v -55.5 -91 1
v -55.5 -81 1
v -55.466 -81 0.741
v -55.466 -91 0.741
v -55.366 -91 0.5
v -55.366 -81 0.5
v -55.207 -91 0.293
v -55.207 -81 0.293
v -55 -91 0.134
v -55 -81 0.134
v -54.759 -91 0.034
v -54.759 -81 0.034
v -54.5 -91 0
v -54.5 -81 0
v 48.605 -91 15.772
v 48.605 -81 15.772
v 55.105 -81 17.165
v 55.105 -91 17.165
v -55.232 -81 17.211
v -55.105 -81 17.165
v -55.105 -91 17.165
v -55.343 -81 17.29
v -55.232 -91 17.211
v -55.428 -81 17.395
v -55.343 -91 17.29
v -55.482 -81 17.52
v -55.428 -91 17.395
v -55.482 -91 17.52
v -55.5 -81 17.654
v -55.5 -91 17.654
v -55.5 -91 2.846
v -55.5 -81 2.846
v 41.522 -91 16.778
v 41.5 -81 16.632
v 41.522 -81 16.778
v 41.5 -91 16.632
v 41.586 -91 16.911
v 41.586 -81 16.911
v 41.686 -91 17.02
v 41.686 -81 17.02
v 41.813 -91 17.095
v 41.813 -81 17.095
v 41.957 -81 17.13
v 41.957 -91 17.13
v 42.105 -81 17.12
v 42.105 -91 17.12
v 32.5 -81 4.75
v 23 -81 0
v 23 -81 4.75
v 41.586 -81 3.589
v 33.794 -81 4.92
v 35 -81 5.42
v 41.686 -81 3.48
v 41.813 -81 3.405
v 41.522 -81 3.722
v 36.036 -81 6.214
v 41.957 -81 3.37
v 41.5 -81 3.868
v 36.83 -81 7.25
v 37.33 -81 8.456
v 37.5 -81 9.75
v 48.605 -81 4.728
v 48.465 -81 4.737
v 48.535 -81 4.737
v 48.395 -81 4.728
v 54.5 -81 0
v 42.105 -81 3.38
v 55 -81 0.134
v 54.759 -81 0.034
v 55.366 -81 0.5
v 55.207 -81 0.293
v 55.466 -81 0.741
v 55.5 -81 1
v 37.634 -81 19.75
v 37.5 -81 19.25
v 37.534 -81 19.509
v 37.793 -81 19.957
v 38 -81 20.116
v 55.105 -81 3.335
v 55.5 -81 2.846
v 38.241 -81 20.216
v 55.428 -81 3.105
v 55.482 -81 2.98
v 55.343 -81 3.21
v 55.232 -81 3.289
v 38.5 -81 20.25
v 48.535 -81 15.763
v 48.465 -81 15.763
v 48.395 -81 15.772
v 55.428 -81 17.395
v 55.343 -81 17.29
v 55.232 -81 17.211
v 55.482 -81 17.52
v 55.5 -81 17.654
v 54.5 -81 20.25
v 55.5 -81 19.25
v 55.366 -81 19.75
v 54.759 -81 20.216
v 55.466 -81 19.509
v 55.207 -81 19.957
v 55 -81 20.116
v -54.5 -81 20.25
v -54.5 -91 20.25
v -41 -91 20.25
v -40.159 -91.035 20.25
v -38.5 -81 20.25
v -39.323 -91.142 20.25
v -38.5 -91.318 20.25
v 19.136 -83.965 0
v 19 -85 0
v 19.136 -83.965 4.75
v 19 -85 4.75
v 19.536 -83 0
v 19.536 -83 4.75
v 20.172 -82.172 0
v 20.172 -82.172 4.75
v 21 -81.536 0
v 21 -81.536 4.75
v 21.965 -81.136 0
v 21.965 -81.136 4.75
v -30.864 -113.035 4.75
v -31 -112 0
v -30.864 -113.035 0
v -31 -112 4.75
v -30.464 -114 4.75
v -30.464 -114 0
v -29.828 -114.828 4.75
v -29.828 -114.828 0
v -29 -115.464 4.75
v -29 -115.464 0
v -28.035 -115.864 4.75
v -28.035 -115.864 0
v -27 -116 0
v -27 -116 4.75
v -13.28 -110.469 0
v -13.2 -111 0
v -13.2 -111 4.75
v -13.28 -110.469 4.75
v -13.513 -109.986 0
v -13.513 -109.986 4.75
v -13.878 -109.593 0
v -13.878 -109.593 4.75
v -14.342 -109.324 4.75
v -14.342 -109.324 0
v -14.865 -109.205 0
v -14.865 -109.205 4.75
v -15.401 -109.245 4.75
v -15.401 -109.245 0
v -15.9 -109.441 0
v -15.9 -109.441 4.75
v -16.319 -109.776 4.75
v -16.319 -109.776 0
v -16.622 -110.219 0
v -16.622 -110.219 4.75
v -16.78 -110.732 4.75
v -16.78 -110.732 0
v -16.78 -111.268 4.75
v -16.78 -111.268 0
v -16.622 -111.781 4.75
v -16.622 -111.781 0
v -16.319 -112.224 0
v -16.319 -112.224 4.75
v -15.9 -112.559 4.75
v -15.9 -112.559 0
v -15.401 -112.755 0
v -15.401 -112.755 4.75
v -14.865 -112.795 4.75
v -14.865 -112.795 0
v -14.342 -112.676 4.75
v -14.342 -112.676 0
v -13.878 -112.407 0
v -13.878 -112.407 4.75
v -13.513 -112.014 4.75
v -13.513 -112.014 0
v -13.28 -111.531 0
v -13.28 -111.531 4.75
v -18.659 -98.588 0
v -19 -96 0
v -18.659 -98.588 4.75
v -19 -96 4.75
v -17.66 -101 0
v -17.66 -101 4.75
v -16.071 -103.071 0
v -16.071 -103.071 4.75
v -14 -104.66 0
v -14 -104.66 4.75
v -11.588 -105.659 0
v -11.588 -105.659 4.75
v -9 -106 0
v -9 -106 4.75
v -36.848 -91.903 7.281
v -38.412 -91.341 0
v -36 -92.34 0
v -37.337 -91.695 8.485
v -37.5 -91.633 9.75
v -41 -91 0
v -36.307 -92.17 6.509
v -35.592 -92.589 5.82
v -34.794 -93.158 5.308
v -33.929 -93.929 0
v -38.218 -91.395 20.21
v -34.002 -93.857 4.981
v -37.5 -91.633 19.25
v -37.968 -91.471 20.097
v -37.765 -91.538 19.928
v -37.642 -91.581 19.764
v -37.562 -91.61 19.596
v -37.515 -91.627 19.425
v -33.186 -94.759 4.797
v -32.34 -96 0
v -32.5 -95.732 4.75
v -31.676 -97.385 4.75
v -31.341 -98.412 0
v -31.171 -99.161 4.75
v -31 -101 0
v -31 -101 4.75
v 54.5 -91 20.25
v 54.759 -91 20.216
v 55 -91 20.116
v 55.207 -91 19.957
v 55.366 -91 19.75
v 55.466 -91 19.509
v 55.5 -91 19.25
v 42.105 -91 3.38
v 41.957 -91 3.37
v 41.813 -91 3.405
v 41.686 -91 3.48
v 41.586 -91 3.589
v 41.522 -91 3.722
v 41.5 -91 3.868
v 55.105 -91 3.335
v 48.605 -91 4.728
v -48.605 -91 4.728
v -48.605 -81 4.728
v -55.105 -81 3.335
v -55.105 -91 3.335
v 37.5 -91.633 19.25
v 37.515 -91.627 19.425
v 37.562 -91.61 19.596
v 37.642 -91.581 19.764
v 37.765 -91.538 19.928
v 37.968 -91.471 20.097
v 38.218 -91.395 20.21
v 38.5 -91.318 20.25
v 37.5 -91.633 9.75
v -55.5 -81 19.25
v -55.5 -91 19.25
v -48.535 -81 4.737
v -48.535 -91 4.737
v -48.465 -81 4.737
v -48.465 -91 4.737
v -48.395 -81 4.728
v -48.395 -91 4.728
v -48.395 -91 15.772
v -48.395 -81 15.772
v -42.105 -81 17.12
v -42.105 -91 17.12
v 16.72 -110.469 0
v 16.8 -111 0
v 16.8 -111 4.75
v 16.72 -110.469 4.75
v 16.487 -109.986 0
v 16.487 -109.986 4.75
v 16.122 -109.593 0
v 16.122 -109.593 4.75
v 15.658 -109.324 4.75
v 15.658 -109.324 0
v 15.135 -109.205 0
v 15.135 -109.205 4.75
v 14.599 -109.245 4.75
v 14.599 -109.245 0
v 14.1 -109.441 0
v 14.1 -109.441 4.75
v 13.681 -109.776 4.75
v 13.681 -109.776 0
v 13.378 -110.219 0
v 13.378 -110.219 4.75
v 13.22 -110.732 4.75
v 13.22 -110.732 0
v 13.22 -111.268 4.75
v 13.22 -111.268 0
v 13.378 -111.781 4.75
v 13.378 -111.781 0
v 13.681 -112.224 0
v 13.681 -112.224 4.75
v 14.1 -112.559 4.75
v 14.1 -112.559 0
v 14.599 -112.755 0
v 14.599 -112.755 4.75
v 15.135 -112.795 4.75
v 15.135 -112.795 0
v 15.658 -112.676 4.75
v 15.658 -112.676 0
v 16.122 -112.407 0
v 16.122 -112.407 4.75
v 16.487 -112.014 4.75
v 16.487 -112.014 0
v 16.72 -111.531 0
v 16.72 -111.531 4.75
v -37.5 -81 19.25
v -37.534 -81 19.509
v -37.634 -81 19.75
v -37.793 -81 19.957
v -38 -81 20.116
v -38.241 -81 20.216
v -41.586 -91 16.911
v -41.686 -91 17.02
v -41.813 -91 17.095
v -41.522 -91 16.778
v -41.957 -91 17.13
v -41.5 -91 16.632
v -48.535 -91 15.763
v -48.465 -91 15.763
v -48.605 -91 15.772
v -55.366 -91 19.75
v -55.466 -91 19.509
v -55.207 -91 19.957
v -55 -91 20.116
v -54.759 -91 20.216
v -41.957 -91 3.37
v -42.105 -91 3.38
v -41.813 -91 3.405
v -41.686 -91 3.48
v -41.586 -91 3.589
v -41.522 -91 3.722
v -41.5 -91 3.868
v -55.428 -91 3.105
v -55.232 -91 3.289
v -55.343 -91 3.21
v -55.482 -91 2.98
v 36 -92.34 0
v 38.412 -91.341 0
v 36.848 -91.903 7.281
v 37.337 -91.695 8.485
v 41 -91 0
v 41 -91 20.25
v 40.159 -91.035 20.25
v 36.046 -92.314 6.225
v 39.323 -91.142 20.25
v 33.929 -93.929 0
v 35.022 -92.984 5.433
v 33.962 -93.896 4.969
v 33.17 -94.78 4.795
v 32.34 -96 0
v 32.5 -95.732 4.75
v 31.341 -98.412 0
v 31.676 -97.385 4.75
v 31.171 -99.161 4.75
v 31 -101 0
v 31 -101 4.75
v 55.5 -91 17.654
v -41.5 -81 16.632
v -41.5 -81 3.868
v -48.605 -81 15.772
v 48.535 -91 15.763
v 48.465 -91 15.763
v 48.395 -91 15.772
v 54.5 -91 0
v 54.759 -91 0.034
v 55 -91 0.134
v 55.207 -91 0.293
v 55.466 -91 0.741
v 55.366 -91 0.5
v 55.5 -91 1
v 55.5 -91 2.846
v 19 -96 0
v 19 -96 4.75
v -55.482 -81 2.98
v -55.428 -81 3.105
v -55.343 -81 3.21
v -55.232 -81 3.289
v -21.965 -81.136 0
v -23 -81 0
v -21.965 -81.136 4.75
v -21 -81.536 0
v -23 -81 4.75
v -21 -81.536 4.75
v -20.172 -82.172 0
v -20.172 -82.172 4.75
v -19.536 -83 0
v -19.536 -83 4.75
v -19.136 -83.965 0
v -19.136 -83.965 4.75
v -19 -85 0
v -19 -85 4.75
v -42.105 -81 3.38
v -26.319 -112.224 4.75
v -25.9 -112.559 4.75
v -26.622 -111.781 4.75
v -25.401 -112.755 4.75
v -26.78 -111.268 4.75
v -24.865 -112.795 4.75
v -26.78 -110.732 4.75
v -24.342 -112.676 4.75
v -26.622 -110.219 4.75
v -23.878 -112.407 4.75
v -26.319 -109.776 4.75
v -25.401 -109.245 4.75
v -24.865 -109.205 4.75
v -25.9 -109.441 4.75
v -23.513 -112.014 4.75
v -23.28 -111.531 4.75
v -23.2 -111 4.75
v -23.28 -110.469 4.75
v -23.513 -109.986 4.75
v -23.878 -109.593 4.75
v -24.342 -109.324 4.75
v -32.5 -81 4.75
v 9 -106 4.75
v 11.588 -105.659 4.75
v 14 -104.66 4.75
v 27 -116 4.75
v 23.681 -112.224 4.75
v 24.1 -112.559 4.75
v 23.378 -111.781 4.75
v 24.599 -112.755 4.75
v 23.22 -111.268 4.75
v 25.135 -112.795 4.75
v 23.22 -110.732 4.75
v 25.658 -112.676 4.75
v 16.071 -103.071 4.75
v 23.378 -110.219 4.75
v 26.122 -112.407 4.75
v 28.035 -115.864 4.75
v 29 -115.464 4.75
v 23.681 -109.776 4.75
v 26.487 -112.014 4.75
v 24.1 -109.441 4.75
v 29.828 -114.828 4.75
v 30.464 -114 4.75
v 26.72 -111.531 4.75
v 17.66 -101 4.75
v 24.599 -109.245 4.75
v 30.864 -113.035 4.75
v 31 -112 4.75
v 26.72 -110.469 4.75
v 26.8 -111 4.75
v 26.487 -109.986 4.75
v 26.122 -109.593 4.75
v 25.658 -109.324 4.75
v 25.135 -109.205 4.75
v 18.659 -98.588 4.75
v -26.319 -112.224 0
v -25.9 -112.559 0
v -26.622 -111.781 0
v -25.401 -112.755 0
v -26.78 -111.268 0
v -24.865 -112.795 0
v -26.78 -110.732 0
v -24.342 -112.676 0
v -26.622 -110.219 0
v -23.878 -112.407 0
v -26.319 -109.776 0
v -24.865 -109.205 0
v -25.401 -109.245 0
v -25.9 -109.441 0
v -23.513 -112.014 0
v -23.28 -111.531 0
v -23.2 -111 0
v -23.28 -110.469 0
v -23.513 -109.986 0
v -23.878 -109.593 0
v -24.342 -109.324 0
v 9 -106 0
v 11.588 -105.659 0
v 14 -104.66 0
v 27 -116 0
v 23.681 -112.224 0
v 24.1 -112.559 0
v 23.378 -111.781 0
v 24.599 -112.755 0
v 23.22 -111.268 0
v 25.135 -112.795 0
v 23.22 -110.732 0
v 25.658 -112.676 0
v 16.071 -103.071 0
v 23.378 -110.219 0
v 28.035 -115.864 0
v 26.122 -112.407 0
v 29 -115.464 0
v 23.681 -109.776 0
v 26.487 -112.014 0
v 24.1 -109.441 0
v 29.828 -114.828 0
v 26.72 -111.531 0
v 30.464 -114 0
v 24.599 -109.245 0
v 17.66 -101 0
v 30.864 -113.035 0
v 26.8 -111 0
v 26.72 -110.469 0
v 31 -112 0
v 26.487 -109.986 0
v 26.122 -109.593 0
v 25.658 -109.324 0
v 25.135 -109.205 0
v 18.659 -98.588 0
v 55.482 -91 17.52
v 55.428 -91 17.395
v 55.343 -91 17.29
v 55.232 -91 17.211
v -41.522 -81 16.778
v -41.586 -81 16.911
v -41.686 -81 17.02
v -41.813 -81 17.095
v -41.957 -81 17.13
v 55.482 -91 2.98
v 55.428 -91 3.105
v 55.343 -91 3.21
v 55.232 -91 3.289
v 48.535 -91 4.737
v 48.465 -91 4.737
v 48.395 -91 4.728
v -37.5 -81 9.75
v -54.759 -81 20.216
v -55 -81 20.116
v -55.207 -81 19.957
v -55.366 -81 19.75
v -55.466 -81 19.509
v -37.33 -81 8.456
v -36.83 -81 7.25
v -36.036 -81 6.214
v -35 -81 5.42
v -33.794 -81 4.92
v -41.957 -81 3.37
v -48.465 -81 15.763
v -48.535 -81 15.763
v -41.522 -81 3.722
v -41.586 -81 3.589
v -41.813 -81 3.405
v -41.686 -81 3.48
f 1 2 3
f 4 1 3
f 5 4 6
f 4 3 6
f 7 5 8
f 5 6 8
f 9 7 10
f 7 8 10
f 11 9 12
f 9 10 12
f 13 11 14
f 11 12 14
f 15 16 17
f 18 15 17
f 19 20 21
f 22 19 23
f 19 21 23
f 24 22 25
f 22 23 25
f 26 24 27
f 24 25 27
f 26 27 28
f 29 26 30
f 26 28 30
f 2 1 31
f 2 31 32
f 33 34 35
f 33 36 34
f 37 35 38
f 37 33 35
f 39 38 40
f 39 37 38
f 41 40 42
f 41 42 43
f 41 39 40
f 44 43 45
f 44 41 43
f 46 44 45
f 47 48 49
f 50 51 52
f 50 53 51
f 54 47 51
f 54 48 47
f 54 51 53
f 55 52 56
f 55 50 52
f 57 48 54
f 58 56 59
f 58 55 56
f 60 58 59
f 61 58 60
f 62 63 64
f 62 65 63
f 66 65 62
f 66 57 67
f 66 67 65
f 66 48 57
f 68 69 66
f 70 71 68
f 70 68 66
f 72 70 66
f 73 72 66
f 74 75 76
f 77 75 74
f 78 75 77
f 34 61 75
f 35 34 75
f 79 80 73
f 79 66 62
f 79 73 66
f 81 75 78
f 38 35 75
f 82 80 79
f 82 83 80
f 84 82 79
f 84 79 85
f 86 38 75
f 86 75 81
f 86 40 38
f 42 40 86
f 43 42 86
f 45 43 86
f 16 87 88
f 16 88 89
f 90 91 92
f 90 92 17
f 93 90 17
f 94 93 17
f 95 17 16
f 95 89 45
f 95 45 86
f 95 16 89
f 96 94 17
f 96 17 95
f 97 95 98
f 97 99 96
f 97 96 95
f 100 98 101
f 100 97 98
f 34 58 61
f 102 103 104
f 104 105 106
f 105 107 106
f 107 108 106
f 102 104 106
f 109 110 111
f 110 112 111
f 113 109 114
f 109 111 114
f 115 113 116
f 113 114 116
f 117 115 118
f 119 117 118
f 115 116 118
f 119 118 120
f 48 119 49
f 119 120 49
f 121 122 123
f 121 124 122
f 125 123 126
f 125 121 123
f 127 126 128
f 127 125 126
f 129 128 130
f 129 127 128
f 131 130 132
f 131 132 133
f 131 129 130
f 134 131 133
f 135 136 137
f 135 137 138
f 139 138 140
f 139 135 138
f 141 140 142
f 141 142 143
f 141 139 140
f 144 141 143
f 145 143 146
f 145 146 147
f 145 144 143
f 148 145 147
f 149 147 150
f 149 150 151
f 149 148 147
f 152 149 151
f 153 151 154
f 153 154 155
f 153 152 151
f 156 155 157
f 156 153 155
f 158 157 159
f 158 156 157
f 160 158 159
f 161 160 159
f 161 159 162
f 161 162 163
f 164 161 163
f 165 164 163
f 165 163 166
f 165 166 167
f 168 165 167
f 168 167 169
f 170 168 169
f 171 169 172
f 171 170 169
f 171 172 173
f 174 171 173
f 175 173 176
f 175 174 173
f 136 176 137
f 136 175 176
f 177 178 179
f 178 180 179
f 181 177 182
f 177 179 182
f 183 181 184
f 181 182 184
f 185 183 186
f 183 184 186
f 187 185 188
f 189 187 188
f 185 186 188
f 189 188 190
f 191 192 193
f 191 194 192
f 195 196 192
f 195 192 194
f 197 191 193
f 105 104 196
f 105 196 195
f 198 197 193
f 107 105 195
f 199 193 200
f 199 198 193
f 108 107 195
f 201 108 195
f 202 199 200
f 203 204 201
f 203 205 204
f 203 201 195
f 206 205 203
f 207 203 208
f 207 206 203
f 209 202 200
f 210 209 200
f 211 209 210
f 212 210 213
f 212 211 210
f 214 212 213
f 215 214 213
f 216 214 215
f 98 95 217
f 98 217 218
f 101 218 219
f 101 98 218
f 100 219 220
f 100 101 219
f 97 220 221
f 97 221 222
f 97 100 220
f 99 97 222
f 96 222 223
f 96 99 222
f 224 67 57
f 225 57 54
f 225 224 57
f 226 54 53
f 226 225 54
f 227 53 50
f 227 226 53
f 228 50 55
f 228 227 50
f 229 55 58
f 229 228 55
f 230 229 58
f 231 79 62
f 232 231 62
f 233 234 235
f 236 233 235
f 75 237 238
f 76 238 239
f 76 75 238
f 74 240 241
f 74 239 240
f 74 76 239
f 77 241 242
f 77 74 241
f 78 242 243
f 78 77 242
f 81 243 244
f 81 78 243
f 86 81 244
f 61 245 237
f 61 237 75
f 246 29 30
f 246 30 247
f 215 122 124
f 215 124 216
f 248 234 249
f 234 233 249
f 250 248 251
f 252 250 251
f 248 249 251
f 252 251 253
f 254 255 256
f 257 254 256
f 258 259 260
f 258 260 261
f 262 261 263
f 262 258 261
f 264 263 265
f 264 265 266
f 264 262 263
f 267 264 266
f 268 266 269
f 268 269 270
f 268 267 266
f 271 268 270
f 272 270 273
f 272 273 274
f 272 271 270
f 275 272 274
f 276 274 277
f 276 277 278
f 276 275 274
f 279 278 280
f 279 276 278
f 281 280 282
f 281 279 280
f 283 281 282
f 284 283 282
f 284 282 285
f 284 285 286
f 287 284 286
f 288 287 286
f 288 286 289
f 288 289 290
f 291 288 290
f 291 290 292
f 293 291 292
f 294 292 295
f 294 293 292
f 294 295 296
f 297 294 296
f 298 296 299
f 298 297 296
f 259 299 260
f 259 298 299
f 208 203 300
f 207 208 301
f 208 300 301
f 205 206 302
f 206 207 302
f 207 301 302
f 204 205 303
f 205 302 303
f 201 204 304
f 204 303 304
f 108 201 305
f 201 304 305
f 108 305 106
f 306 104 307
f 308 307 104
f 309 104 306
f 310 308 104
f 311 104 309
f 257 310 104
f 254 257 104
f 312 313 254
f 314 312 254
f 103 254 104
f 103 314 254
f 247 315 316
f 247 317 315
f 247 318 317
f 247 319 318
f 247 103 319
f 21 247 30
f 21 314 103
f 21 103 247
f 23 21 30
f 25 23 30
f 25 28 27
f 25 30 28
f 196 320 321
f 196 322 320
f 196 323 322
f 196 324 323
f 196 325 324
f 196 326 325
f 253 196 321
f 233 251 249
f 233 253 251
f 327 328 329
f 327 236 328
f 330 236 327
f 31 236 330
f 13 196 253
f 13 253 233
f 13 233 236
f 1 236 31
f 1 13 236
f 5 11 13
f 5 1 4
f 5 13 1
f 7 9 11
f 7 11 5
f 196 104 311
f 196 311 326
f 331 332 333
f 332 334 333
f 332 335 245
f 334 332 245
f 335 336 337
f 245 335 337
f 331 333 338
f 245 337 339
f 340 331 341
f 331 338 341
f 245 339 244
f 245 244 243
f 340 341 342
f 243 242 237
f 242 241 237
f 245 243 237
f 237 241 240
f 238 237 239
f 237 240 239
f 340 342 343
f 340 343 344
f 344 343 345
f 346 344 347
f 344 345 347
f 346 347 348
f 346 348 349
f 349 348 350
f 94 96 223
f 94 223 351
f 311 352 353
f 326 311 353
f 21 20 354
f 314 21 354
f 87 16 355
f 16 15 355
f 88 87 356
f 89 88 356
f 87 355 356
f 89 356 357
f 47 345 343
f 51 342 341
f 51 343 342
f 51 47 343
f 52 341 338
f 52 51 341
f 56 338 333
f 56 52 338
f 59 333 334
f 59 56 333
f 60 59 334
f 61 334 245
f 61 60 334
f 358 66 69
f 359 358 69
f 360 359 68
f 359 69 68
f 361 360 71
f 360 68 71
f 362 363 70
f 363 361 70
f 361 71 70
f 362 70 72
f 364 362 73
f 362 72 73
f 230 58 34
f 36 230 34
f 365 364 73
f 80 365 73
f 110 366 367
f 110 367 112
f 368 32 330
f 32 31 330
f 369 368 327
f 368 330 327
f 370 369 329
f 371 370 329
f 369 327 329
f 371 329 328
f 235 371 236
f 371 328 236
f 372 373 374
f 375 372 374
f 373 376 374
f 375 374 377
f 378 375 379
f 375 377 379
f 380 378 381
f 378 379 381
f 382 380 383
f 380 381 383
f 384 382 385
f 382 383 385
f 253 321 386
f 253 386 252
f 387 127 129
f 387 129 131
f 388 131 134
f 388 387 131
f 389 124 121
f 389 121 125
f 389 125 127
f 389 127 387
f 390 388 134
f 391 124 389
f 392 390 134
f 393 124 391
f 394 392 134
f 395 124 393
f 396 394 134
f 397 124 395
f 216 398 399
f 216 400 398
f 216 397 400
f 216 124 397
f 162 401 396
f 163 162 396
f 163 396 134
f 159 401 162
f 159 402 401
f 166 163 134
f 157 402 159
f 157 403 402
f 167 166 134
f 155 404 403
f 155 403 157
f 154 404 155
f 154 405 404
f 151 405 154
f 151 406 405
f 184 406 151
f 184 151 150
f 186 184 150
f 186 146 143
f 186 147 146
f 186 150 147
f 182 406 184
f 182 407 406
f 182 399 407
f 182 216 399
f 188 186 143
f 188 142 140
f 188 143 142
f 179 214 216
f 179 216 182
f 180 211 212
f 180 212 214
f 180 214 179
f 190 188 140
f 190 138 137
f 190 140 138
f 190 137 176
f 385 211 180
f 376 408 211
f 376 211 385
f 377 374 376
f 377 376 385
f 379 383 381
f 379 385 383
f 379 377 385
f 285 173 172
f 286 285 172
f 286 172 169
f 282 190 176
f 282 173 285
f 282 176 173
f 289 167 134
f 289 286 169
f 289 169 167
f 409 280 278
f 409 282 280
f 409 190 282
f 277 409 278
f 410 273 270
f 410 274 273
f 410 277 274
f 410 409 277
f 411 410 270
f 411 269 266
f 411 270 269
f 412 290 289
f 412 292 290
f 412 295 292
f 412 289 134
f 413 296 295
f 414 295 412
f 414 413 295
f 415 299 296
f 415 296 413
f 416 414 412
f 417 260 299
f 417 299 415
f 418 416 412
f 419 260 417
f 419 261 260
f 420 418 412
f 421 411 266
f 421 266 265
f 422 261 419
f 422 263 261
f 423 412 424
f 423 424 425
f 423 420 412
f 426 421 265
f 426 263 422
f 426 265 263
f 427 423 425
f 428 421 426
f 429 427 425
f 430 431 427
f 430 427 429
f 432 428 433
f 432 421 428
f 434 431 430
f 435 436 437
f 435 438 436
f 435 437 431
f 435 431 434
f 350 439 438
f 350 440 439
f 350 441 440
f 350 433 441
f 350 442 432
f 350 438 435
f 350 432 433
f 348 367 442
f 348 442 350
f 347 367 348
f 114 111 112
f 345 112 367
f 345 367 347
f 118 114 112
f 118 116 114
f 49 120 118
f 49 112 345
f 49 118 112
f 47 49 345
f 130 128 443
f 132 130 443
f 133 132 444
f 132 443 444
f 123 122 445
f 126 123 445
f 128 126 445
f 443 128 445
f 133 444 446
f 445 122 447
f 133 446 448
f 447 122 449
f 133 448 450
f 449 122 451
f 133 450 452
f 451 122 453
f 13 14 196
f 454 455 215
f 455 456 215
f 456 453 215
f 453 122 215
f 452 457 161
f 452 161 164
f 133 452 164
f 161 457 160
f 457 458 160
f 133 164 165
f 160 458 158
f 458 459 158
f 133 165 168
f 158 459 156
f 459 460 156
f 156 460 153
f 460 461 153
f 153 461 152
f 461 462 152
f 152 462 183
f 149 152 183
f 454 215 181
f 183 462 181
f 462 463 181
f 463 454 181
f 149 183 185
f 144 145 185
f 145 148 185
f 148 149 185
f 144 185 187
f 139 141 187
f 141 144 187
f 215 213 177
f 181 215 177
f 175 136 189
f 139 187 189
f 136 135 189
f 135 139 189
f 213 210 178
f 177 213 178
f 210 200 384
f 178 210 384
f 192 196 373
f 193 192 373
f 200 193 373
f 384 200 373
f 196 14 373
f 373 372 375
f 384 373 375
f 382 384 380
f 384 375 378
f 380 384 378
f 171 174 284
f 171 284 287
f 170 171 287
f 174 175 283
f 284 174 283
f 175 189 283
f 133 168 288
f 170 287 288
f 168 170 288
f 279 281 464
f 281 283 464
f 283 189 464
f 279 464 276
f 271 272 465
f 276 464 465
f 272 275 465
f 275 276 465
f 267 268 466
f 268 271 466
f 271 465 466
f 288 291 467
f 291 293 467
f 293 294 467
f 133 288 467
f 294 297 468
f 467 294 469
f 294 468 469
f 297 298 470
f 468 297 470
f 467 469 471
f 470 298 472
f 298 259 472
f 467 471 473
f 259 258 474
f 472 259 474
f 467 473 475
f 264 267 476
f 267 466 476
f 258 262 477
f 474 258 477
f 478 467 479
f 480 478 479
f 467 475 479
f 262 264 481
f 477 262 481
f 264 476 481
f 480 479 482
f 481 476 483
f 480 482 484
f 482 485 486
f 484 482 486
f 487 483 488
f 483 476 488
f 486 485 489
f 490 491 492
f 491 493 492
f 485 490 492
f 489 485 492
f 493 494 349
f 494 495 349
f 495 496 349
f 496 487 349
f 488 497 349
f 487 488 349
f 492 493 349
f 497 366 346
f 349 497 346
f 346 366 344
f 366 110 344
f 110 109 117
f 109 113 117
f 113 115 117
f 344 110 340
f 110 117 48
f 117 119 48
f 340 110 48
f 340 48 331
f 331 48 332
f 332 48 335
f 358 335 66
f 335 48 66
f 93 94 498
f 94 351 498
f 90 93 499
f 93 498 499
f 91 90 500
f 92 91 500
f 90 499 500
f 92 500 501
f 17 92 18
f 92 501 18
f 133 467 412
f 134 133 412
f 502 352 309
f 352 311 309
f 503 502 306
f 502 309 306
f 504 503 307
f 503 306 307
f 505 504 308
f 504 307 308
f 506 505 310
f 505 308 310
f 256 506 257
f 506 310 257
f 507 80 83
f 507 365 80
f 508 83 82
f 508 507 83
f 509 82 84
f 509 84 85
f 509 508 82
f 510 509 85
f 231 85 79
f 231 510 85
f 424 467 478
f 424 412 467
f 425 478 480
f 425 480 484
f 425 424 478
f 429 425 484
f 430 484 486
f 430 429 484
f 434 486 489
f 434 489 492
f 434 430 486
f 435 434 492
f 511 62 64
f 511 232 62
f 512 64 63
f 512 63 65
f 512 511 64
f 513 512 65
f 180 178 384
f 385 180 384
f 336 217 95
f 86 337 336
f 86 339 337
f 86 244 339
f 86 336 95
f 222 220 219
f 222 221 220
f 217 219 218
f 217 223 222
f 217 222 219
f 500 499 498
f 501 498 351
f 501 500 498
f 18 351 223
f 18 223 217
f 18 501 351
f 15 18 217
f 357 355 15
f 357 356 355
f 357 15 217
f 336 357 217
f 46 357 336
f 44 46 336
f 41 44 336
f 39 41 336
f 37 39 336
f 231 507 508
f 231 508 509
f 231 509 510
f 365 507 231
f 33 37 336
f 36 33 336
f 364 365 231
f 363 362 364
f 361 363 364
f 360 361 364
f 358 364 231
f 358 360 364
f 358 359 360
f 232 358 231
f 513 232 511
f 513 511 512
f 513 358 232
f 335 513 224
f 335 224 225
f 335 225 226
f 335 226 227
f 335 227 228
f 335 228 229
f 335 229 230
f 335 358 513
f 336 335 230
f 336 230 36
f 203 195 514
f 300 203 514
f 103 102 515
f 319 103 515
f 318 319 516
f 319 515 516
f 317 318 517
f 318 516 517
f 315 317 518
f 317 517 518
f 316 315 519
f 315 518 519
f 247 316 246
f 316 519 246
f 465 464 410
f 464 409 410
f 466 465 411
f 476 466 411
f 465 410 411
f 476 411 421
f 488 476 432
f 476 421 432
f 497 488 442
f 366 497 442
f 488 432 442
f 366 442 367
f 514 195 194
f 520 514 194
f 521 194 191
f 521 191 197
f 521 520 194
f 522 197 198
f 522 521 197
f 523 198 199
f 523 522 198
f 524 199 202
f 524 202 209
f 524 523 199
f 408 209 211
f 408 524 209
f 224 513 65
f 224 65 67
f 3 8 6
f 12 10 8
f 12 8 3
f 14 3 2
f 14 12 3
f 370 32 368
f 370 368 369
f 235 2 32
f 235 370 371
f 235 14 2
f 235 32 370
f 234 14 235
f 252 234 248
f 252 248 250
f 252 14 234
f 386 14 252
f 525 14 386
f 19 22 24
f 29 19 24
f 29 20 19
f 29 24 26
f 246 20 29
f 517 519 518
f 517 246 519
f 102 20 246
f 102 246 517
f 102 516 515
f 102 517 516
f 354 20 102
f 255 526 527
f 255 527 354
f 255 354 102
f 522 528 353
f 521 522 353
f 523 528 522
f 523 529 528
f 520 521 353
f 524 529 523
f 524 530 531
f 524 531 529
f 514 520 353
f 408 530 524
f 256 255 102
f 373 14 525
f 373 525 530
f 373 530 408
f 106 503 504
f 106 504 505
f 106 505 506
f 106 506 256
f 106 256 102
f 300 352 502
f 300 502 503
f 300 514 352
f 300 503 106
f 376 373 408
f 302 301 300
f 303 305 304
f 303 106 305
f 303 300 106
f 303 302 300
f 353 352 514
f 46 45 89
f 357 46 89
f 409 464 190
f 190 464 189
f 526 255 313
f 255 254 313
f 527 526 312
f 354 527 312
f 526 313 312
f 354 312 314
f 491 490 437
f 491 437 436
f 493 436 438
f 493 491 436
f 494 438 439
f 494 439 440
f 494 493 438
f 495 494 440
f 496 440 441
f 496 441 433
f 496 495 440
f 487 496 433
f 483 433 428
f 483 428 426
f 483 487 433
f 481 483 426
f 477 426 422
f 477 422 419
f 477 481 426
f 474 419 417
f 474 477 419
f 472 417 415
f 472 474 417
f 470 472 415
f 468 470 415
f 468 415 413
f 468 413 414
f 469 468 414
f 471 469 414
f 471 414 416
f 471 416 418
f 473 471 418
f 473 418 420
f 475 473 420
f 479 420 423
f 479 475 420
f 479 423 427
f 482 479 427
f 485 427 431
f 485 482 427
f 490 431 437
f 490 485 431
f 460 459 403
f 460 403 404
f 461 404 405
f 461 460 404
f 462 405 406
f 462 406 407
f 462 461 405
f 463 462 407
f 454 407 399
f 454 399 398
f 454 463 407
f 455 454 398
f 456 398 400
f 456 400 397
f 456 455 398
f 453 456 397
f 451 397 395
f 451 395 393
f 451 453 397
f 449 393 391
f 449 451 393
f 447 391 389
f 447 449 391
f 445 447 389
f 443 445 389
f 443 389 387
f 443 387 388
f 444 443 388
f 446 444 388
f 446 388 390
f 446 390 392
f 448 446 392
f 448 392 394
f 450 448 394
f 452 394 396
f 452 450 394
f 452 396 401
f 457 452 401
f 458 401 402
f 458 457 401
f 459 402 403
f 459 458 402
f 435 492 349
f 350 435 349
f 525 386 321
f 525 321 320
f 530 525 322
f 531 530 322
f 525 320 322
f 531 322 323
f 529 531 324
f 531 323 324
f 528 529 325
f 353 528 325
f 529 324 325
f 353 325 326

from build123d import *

# Parameters (mm, degrees)
SKETCH_1_W          = 111
SKETCH_1_H          = 35
SKETCH_1_R          = 1.8
EXTRUDE_1_DEPTH     = 4.75
SKETCH_2_W          = 4
SKETCH_2_H          = 35
EXTRUDE_2_DEPTH     = 15.5
SKETCH_3_W          = 4.5
SKETCH_3_H          = 35
EXTRUDE_3_DEPTH     = 14
SKETCH_4_W          = 4.5
SKETCH_4_H          = 35
EXTRUDE_4_DEPTH     = 14
FILLET_1_R          = 5
FILLET_2_R          = 1
SKETCH_5_W          = 20
SKETCH_5_H          = 2
CUT_EXTRUDE_1_DEPTH = 1
CUT_EXTRUDE_2_DEPTH = 200
SKETCH_8_W          = 33.5
SKETCH_8_H          = 25
SKETCH_8_W_2        = 38
CUT_EXTRUDE_3_DEPTH = 1000
FILLET_8_R          = 10
FILLET_9_R          = 4
FILLET_10_R         = 0.5


with BuildPart() as part:
    # ｽｹｯﾁ1 → ﾎﾞｽ - 押し出し1 (new body)
    with BuildSketch(Plane.XY):
        with Locations((0, -98.5)):
            Rectangle(SKETCH_1_W, SKETCH_1_H)
        with Locations((25, -111)):
            Circle(SKETCH_1_R, mode=Mode.SUBTRACT)
        with Locations((15, -111)):
            Circle(SKETCH_1_R, mode=Mode.SUBTRACT)
        with Locations((-15, -111)):
            Circle(SKETCH_1_R, mode=Mode.SUBTRACT)
        with Locations((-25, -111)):
            Circle(SKETCH_1_R, mode=Mode.SUBTRACT)
    extrude(amount=EXTRUDE_1_DEPTH)

    # ｽｹｯﾁ2 → ﾎﾞｽ - 押し出し2 (add)
    with BuildSketch(Plane.XY.offset(4.75)):
        with Locations((39.5, -98.5)):
            Rectangle(SKETCH_2_W, SKETCH_2_H)
        with Locations((-39.5, -98.5)):
            Rectangle(SKETCH_2_W, SKETCH_2_H)
    extrude(amount=EXTRUDE_2_DEPTH)

    # ｽｹｯﾁ3 → ﾎﾞｽ - 押し出し3 (add)
    with BuildSketch(Plane(origin=(41.5, 0, 0), x_dir=(0, 0, -1), z_dir=(1, 0, 0))):
        with Locations((-18, -98.5)):
            Rectangle(SKETCH_3_W, SKETCH_3_H)
    extrude(amount=EXTRUDE_3_DEPTH)

    # ｽｹｯﾁ4 → ﾎﾞｽ - 押し出し4 (add)
    with BuildSketch(Plane.ZY.offset(41.5)):
        with Locations((18, -98.5)):
            Rectangle(SKETCH_4_W, SKETCH_4_H)
    extrude(amount=EXTRUDE_4_DEPTH)

    # ﾌｨﾚｯﾄ1
    fillet_1_edges = [part.edges().sort_by_distance(p)[0] for p in [
        (37.5, -98.5, 4.75),
        (-37.5, -98.5, 4.75),
    ]]
    fillet(fillet_1_edges, radius=FILLET_1_R)

    # ﾌｨﾚｯﾄ2
    fillet_2_edges = [part.edges().sort_by_distance(p)[0] for p in [
        (37.5, -98.5, 20.25),
        (-37.5, -98.5, 20.25),
        (-55.5, -98.5, 0),
        (55.5, -98.5, 20.25),
        (55.5, -98.5, 0),
        (-55.5, -98.5, 20.25),
    ]]
    fillet(fillet_2_edges, radius=FILLET_2_R)

    # ｽｹｯﾁ5 → ｶｯﾄ - 押し出し1 (cut)
    with BuildSketch(Plane(origin=(0, -81, 0), x_dir=(1, 0, 0), z_dir=(0, 1, 0))):
        with Locations((0, -3.75)):
            Rectangle(SKETCH_5_W, SKETCH_5_H)
    extrude(amount=-CUT_EXTRUDE_1_DEPTH, mode=Mode.SUBTRACT)

    # ｽｹｯﾁ6 → ｶｯﾄ - 押し出し2 (cut)
    with BuildSketch(Plane(origin=(0, -81, 0), x_dir=(1, 0, 0), z_dir=(0, 1, 0))):
        Polygon((-55.5, -4.75), (-48.5, -4.75), (-55.5, -3.25), align=None)
        Polygon((-41.5, -4.75), (-41.5, -3.25), (-48.5, -4.75), align=None)
        Polygon((-41.5, -15.75), (-48.5, -15.75), (-41.5, -17.25), align=None)
        Polygon((-55.5, -17.25), (-48.5, -15.75), (-55.5, -15.75), align=None)
        Polygon((55.5, -4.75), (55.5, -3.25), (48.5, -4.75), align=None)
        Polygon((41.5, -4.75), (48.5, -4.75), (41.5, -3.25), align=None)
        Polygon((55.5, -15.75), (48.5, -15.75), (55.5, -17.25), align=None)
        Polygon((41.5, -15.75), (41.5, -17.25), (48.5, -15.75), align=None)
    extrude(amount=-CUT_EXTRUDE_2_DEPTH, mode=Mode.SUBTRACT)

    # ｽｹｯﾁ8 → ｶｯﾄ - 押し出し3 (cut)
    with BuildSketch(Plane(origin=(0, 0, 0), x_dir=(-1, 0, 0), z_dir=(0, 0, -1))):
        with Locations((-47.75, -103.5)):
            Rectangle(SKETCH_8_W, SKETCH_8_H)
        with Locations((0, -93.5)):
            Rectangle(SKETCH_8_W_2, SKETCH_8_H)
        with Locations((47.75, -103.5)):
            Rectangle(SKETCH_8_W, SKETCH_8_H)
    extrude(amount=-CUT_EXTRUDE_3_DEPTH, mode=Mode.SUBTRACT)

    # ﾌｨﾚｯﾄ8
    fillet_8_edges = [part.edges().sort_by_distance(p)[0] for p in [
        (-31, -91, 2.375),
        (31, -91, 2.375),
        (-19, -106, 2.375),
        (19, -106, 2.375),
    ]]
    fillet(fillet_8_edges, radius=FILLET_8_R)

    # ﾌｨﾚｯﾄ9
    fillet_9_edges = [part.edges().sort_by_distance(p)[0] for p in [
        (31, -116, 2.375),
        (-31, -116, 2.375),
        (19, -81, 2.375),
        (-19, -81, 2.375),
    ]]
    fillet(fillet_9_edges, radius=FILLET_9_R)

    # ﾌｨﾚｯﾄ10
    fillet_10_edges = [part.edges().sort_by_distance(p)[0] for p in [
        (-55.5, -86, 17.25),
        (48.5, -86, 15.75),
        (55.5, -86, 17.25),
        (48.5, -86, 4.75),
        (41.5, -86, 3.25),
        (-48.5, -86, 15.75),
        (-41.5, -86, 17.25),
        (-41.5, -86, 3.25),
        (-48.5, -86, 4.75),
        (-55.5, -86, 3.25),
        (55.5, -86, 3.25),
        (41.5, -86, 17.25),
    ]]
    fillet(fillet_10_edges, radius=FILLET_10_R)


solid = part.part
